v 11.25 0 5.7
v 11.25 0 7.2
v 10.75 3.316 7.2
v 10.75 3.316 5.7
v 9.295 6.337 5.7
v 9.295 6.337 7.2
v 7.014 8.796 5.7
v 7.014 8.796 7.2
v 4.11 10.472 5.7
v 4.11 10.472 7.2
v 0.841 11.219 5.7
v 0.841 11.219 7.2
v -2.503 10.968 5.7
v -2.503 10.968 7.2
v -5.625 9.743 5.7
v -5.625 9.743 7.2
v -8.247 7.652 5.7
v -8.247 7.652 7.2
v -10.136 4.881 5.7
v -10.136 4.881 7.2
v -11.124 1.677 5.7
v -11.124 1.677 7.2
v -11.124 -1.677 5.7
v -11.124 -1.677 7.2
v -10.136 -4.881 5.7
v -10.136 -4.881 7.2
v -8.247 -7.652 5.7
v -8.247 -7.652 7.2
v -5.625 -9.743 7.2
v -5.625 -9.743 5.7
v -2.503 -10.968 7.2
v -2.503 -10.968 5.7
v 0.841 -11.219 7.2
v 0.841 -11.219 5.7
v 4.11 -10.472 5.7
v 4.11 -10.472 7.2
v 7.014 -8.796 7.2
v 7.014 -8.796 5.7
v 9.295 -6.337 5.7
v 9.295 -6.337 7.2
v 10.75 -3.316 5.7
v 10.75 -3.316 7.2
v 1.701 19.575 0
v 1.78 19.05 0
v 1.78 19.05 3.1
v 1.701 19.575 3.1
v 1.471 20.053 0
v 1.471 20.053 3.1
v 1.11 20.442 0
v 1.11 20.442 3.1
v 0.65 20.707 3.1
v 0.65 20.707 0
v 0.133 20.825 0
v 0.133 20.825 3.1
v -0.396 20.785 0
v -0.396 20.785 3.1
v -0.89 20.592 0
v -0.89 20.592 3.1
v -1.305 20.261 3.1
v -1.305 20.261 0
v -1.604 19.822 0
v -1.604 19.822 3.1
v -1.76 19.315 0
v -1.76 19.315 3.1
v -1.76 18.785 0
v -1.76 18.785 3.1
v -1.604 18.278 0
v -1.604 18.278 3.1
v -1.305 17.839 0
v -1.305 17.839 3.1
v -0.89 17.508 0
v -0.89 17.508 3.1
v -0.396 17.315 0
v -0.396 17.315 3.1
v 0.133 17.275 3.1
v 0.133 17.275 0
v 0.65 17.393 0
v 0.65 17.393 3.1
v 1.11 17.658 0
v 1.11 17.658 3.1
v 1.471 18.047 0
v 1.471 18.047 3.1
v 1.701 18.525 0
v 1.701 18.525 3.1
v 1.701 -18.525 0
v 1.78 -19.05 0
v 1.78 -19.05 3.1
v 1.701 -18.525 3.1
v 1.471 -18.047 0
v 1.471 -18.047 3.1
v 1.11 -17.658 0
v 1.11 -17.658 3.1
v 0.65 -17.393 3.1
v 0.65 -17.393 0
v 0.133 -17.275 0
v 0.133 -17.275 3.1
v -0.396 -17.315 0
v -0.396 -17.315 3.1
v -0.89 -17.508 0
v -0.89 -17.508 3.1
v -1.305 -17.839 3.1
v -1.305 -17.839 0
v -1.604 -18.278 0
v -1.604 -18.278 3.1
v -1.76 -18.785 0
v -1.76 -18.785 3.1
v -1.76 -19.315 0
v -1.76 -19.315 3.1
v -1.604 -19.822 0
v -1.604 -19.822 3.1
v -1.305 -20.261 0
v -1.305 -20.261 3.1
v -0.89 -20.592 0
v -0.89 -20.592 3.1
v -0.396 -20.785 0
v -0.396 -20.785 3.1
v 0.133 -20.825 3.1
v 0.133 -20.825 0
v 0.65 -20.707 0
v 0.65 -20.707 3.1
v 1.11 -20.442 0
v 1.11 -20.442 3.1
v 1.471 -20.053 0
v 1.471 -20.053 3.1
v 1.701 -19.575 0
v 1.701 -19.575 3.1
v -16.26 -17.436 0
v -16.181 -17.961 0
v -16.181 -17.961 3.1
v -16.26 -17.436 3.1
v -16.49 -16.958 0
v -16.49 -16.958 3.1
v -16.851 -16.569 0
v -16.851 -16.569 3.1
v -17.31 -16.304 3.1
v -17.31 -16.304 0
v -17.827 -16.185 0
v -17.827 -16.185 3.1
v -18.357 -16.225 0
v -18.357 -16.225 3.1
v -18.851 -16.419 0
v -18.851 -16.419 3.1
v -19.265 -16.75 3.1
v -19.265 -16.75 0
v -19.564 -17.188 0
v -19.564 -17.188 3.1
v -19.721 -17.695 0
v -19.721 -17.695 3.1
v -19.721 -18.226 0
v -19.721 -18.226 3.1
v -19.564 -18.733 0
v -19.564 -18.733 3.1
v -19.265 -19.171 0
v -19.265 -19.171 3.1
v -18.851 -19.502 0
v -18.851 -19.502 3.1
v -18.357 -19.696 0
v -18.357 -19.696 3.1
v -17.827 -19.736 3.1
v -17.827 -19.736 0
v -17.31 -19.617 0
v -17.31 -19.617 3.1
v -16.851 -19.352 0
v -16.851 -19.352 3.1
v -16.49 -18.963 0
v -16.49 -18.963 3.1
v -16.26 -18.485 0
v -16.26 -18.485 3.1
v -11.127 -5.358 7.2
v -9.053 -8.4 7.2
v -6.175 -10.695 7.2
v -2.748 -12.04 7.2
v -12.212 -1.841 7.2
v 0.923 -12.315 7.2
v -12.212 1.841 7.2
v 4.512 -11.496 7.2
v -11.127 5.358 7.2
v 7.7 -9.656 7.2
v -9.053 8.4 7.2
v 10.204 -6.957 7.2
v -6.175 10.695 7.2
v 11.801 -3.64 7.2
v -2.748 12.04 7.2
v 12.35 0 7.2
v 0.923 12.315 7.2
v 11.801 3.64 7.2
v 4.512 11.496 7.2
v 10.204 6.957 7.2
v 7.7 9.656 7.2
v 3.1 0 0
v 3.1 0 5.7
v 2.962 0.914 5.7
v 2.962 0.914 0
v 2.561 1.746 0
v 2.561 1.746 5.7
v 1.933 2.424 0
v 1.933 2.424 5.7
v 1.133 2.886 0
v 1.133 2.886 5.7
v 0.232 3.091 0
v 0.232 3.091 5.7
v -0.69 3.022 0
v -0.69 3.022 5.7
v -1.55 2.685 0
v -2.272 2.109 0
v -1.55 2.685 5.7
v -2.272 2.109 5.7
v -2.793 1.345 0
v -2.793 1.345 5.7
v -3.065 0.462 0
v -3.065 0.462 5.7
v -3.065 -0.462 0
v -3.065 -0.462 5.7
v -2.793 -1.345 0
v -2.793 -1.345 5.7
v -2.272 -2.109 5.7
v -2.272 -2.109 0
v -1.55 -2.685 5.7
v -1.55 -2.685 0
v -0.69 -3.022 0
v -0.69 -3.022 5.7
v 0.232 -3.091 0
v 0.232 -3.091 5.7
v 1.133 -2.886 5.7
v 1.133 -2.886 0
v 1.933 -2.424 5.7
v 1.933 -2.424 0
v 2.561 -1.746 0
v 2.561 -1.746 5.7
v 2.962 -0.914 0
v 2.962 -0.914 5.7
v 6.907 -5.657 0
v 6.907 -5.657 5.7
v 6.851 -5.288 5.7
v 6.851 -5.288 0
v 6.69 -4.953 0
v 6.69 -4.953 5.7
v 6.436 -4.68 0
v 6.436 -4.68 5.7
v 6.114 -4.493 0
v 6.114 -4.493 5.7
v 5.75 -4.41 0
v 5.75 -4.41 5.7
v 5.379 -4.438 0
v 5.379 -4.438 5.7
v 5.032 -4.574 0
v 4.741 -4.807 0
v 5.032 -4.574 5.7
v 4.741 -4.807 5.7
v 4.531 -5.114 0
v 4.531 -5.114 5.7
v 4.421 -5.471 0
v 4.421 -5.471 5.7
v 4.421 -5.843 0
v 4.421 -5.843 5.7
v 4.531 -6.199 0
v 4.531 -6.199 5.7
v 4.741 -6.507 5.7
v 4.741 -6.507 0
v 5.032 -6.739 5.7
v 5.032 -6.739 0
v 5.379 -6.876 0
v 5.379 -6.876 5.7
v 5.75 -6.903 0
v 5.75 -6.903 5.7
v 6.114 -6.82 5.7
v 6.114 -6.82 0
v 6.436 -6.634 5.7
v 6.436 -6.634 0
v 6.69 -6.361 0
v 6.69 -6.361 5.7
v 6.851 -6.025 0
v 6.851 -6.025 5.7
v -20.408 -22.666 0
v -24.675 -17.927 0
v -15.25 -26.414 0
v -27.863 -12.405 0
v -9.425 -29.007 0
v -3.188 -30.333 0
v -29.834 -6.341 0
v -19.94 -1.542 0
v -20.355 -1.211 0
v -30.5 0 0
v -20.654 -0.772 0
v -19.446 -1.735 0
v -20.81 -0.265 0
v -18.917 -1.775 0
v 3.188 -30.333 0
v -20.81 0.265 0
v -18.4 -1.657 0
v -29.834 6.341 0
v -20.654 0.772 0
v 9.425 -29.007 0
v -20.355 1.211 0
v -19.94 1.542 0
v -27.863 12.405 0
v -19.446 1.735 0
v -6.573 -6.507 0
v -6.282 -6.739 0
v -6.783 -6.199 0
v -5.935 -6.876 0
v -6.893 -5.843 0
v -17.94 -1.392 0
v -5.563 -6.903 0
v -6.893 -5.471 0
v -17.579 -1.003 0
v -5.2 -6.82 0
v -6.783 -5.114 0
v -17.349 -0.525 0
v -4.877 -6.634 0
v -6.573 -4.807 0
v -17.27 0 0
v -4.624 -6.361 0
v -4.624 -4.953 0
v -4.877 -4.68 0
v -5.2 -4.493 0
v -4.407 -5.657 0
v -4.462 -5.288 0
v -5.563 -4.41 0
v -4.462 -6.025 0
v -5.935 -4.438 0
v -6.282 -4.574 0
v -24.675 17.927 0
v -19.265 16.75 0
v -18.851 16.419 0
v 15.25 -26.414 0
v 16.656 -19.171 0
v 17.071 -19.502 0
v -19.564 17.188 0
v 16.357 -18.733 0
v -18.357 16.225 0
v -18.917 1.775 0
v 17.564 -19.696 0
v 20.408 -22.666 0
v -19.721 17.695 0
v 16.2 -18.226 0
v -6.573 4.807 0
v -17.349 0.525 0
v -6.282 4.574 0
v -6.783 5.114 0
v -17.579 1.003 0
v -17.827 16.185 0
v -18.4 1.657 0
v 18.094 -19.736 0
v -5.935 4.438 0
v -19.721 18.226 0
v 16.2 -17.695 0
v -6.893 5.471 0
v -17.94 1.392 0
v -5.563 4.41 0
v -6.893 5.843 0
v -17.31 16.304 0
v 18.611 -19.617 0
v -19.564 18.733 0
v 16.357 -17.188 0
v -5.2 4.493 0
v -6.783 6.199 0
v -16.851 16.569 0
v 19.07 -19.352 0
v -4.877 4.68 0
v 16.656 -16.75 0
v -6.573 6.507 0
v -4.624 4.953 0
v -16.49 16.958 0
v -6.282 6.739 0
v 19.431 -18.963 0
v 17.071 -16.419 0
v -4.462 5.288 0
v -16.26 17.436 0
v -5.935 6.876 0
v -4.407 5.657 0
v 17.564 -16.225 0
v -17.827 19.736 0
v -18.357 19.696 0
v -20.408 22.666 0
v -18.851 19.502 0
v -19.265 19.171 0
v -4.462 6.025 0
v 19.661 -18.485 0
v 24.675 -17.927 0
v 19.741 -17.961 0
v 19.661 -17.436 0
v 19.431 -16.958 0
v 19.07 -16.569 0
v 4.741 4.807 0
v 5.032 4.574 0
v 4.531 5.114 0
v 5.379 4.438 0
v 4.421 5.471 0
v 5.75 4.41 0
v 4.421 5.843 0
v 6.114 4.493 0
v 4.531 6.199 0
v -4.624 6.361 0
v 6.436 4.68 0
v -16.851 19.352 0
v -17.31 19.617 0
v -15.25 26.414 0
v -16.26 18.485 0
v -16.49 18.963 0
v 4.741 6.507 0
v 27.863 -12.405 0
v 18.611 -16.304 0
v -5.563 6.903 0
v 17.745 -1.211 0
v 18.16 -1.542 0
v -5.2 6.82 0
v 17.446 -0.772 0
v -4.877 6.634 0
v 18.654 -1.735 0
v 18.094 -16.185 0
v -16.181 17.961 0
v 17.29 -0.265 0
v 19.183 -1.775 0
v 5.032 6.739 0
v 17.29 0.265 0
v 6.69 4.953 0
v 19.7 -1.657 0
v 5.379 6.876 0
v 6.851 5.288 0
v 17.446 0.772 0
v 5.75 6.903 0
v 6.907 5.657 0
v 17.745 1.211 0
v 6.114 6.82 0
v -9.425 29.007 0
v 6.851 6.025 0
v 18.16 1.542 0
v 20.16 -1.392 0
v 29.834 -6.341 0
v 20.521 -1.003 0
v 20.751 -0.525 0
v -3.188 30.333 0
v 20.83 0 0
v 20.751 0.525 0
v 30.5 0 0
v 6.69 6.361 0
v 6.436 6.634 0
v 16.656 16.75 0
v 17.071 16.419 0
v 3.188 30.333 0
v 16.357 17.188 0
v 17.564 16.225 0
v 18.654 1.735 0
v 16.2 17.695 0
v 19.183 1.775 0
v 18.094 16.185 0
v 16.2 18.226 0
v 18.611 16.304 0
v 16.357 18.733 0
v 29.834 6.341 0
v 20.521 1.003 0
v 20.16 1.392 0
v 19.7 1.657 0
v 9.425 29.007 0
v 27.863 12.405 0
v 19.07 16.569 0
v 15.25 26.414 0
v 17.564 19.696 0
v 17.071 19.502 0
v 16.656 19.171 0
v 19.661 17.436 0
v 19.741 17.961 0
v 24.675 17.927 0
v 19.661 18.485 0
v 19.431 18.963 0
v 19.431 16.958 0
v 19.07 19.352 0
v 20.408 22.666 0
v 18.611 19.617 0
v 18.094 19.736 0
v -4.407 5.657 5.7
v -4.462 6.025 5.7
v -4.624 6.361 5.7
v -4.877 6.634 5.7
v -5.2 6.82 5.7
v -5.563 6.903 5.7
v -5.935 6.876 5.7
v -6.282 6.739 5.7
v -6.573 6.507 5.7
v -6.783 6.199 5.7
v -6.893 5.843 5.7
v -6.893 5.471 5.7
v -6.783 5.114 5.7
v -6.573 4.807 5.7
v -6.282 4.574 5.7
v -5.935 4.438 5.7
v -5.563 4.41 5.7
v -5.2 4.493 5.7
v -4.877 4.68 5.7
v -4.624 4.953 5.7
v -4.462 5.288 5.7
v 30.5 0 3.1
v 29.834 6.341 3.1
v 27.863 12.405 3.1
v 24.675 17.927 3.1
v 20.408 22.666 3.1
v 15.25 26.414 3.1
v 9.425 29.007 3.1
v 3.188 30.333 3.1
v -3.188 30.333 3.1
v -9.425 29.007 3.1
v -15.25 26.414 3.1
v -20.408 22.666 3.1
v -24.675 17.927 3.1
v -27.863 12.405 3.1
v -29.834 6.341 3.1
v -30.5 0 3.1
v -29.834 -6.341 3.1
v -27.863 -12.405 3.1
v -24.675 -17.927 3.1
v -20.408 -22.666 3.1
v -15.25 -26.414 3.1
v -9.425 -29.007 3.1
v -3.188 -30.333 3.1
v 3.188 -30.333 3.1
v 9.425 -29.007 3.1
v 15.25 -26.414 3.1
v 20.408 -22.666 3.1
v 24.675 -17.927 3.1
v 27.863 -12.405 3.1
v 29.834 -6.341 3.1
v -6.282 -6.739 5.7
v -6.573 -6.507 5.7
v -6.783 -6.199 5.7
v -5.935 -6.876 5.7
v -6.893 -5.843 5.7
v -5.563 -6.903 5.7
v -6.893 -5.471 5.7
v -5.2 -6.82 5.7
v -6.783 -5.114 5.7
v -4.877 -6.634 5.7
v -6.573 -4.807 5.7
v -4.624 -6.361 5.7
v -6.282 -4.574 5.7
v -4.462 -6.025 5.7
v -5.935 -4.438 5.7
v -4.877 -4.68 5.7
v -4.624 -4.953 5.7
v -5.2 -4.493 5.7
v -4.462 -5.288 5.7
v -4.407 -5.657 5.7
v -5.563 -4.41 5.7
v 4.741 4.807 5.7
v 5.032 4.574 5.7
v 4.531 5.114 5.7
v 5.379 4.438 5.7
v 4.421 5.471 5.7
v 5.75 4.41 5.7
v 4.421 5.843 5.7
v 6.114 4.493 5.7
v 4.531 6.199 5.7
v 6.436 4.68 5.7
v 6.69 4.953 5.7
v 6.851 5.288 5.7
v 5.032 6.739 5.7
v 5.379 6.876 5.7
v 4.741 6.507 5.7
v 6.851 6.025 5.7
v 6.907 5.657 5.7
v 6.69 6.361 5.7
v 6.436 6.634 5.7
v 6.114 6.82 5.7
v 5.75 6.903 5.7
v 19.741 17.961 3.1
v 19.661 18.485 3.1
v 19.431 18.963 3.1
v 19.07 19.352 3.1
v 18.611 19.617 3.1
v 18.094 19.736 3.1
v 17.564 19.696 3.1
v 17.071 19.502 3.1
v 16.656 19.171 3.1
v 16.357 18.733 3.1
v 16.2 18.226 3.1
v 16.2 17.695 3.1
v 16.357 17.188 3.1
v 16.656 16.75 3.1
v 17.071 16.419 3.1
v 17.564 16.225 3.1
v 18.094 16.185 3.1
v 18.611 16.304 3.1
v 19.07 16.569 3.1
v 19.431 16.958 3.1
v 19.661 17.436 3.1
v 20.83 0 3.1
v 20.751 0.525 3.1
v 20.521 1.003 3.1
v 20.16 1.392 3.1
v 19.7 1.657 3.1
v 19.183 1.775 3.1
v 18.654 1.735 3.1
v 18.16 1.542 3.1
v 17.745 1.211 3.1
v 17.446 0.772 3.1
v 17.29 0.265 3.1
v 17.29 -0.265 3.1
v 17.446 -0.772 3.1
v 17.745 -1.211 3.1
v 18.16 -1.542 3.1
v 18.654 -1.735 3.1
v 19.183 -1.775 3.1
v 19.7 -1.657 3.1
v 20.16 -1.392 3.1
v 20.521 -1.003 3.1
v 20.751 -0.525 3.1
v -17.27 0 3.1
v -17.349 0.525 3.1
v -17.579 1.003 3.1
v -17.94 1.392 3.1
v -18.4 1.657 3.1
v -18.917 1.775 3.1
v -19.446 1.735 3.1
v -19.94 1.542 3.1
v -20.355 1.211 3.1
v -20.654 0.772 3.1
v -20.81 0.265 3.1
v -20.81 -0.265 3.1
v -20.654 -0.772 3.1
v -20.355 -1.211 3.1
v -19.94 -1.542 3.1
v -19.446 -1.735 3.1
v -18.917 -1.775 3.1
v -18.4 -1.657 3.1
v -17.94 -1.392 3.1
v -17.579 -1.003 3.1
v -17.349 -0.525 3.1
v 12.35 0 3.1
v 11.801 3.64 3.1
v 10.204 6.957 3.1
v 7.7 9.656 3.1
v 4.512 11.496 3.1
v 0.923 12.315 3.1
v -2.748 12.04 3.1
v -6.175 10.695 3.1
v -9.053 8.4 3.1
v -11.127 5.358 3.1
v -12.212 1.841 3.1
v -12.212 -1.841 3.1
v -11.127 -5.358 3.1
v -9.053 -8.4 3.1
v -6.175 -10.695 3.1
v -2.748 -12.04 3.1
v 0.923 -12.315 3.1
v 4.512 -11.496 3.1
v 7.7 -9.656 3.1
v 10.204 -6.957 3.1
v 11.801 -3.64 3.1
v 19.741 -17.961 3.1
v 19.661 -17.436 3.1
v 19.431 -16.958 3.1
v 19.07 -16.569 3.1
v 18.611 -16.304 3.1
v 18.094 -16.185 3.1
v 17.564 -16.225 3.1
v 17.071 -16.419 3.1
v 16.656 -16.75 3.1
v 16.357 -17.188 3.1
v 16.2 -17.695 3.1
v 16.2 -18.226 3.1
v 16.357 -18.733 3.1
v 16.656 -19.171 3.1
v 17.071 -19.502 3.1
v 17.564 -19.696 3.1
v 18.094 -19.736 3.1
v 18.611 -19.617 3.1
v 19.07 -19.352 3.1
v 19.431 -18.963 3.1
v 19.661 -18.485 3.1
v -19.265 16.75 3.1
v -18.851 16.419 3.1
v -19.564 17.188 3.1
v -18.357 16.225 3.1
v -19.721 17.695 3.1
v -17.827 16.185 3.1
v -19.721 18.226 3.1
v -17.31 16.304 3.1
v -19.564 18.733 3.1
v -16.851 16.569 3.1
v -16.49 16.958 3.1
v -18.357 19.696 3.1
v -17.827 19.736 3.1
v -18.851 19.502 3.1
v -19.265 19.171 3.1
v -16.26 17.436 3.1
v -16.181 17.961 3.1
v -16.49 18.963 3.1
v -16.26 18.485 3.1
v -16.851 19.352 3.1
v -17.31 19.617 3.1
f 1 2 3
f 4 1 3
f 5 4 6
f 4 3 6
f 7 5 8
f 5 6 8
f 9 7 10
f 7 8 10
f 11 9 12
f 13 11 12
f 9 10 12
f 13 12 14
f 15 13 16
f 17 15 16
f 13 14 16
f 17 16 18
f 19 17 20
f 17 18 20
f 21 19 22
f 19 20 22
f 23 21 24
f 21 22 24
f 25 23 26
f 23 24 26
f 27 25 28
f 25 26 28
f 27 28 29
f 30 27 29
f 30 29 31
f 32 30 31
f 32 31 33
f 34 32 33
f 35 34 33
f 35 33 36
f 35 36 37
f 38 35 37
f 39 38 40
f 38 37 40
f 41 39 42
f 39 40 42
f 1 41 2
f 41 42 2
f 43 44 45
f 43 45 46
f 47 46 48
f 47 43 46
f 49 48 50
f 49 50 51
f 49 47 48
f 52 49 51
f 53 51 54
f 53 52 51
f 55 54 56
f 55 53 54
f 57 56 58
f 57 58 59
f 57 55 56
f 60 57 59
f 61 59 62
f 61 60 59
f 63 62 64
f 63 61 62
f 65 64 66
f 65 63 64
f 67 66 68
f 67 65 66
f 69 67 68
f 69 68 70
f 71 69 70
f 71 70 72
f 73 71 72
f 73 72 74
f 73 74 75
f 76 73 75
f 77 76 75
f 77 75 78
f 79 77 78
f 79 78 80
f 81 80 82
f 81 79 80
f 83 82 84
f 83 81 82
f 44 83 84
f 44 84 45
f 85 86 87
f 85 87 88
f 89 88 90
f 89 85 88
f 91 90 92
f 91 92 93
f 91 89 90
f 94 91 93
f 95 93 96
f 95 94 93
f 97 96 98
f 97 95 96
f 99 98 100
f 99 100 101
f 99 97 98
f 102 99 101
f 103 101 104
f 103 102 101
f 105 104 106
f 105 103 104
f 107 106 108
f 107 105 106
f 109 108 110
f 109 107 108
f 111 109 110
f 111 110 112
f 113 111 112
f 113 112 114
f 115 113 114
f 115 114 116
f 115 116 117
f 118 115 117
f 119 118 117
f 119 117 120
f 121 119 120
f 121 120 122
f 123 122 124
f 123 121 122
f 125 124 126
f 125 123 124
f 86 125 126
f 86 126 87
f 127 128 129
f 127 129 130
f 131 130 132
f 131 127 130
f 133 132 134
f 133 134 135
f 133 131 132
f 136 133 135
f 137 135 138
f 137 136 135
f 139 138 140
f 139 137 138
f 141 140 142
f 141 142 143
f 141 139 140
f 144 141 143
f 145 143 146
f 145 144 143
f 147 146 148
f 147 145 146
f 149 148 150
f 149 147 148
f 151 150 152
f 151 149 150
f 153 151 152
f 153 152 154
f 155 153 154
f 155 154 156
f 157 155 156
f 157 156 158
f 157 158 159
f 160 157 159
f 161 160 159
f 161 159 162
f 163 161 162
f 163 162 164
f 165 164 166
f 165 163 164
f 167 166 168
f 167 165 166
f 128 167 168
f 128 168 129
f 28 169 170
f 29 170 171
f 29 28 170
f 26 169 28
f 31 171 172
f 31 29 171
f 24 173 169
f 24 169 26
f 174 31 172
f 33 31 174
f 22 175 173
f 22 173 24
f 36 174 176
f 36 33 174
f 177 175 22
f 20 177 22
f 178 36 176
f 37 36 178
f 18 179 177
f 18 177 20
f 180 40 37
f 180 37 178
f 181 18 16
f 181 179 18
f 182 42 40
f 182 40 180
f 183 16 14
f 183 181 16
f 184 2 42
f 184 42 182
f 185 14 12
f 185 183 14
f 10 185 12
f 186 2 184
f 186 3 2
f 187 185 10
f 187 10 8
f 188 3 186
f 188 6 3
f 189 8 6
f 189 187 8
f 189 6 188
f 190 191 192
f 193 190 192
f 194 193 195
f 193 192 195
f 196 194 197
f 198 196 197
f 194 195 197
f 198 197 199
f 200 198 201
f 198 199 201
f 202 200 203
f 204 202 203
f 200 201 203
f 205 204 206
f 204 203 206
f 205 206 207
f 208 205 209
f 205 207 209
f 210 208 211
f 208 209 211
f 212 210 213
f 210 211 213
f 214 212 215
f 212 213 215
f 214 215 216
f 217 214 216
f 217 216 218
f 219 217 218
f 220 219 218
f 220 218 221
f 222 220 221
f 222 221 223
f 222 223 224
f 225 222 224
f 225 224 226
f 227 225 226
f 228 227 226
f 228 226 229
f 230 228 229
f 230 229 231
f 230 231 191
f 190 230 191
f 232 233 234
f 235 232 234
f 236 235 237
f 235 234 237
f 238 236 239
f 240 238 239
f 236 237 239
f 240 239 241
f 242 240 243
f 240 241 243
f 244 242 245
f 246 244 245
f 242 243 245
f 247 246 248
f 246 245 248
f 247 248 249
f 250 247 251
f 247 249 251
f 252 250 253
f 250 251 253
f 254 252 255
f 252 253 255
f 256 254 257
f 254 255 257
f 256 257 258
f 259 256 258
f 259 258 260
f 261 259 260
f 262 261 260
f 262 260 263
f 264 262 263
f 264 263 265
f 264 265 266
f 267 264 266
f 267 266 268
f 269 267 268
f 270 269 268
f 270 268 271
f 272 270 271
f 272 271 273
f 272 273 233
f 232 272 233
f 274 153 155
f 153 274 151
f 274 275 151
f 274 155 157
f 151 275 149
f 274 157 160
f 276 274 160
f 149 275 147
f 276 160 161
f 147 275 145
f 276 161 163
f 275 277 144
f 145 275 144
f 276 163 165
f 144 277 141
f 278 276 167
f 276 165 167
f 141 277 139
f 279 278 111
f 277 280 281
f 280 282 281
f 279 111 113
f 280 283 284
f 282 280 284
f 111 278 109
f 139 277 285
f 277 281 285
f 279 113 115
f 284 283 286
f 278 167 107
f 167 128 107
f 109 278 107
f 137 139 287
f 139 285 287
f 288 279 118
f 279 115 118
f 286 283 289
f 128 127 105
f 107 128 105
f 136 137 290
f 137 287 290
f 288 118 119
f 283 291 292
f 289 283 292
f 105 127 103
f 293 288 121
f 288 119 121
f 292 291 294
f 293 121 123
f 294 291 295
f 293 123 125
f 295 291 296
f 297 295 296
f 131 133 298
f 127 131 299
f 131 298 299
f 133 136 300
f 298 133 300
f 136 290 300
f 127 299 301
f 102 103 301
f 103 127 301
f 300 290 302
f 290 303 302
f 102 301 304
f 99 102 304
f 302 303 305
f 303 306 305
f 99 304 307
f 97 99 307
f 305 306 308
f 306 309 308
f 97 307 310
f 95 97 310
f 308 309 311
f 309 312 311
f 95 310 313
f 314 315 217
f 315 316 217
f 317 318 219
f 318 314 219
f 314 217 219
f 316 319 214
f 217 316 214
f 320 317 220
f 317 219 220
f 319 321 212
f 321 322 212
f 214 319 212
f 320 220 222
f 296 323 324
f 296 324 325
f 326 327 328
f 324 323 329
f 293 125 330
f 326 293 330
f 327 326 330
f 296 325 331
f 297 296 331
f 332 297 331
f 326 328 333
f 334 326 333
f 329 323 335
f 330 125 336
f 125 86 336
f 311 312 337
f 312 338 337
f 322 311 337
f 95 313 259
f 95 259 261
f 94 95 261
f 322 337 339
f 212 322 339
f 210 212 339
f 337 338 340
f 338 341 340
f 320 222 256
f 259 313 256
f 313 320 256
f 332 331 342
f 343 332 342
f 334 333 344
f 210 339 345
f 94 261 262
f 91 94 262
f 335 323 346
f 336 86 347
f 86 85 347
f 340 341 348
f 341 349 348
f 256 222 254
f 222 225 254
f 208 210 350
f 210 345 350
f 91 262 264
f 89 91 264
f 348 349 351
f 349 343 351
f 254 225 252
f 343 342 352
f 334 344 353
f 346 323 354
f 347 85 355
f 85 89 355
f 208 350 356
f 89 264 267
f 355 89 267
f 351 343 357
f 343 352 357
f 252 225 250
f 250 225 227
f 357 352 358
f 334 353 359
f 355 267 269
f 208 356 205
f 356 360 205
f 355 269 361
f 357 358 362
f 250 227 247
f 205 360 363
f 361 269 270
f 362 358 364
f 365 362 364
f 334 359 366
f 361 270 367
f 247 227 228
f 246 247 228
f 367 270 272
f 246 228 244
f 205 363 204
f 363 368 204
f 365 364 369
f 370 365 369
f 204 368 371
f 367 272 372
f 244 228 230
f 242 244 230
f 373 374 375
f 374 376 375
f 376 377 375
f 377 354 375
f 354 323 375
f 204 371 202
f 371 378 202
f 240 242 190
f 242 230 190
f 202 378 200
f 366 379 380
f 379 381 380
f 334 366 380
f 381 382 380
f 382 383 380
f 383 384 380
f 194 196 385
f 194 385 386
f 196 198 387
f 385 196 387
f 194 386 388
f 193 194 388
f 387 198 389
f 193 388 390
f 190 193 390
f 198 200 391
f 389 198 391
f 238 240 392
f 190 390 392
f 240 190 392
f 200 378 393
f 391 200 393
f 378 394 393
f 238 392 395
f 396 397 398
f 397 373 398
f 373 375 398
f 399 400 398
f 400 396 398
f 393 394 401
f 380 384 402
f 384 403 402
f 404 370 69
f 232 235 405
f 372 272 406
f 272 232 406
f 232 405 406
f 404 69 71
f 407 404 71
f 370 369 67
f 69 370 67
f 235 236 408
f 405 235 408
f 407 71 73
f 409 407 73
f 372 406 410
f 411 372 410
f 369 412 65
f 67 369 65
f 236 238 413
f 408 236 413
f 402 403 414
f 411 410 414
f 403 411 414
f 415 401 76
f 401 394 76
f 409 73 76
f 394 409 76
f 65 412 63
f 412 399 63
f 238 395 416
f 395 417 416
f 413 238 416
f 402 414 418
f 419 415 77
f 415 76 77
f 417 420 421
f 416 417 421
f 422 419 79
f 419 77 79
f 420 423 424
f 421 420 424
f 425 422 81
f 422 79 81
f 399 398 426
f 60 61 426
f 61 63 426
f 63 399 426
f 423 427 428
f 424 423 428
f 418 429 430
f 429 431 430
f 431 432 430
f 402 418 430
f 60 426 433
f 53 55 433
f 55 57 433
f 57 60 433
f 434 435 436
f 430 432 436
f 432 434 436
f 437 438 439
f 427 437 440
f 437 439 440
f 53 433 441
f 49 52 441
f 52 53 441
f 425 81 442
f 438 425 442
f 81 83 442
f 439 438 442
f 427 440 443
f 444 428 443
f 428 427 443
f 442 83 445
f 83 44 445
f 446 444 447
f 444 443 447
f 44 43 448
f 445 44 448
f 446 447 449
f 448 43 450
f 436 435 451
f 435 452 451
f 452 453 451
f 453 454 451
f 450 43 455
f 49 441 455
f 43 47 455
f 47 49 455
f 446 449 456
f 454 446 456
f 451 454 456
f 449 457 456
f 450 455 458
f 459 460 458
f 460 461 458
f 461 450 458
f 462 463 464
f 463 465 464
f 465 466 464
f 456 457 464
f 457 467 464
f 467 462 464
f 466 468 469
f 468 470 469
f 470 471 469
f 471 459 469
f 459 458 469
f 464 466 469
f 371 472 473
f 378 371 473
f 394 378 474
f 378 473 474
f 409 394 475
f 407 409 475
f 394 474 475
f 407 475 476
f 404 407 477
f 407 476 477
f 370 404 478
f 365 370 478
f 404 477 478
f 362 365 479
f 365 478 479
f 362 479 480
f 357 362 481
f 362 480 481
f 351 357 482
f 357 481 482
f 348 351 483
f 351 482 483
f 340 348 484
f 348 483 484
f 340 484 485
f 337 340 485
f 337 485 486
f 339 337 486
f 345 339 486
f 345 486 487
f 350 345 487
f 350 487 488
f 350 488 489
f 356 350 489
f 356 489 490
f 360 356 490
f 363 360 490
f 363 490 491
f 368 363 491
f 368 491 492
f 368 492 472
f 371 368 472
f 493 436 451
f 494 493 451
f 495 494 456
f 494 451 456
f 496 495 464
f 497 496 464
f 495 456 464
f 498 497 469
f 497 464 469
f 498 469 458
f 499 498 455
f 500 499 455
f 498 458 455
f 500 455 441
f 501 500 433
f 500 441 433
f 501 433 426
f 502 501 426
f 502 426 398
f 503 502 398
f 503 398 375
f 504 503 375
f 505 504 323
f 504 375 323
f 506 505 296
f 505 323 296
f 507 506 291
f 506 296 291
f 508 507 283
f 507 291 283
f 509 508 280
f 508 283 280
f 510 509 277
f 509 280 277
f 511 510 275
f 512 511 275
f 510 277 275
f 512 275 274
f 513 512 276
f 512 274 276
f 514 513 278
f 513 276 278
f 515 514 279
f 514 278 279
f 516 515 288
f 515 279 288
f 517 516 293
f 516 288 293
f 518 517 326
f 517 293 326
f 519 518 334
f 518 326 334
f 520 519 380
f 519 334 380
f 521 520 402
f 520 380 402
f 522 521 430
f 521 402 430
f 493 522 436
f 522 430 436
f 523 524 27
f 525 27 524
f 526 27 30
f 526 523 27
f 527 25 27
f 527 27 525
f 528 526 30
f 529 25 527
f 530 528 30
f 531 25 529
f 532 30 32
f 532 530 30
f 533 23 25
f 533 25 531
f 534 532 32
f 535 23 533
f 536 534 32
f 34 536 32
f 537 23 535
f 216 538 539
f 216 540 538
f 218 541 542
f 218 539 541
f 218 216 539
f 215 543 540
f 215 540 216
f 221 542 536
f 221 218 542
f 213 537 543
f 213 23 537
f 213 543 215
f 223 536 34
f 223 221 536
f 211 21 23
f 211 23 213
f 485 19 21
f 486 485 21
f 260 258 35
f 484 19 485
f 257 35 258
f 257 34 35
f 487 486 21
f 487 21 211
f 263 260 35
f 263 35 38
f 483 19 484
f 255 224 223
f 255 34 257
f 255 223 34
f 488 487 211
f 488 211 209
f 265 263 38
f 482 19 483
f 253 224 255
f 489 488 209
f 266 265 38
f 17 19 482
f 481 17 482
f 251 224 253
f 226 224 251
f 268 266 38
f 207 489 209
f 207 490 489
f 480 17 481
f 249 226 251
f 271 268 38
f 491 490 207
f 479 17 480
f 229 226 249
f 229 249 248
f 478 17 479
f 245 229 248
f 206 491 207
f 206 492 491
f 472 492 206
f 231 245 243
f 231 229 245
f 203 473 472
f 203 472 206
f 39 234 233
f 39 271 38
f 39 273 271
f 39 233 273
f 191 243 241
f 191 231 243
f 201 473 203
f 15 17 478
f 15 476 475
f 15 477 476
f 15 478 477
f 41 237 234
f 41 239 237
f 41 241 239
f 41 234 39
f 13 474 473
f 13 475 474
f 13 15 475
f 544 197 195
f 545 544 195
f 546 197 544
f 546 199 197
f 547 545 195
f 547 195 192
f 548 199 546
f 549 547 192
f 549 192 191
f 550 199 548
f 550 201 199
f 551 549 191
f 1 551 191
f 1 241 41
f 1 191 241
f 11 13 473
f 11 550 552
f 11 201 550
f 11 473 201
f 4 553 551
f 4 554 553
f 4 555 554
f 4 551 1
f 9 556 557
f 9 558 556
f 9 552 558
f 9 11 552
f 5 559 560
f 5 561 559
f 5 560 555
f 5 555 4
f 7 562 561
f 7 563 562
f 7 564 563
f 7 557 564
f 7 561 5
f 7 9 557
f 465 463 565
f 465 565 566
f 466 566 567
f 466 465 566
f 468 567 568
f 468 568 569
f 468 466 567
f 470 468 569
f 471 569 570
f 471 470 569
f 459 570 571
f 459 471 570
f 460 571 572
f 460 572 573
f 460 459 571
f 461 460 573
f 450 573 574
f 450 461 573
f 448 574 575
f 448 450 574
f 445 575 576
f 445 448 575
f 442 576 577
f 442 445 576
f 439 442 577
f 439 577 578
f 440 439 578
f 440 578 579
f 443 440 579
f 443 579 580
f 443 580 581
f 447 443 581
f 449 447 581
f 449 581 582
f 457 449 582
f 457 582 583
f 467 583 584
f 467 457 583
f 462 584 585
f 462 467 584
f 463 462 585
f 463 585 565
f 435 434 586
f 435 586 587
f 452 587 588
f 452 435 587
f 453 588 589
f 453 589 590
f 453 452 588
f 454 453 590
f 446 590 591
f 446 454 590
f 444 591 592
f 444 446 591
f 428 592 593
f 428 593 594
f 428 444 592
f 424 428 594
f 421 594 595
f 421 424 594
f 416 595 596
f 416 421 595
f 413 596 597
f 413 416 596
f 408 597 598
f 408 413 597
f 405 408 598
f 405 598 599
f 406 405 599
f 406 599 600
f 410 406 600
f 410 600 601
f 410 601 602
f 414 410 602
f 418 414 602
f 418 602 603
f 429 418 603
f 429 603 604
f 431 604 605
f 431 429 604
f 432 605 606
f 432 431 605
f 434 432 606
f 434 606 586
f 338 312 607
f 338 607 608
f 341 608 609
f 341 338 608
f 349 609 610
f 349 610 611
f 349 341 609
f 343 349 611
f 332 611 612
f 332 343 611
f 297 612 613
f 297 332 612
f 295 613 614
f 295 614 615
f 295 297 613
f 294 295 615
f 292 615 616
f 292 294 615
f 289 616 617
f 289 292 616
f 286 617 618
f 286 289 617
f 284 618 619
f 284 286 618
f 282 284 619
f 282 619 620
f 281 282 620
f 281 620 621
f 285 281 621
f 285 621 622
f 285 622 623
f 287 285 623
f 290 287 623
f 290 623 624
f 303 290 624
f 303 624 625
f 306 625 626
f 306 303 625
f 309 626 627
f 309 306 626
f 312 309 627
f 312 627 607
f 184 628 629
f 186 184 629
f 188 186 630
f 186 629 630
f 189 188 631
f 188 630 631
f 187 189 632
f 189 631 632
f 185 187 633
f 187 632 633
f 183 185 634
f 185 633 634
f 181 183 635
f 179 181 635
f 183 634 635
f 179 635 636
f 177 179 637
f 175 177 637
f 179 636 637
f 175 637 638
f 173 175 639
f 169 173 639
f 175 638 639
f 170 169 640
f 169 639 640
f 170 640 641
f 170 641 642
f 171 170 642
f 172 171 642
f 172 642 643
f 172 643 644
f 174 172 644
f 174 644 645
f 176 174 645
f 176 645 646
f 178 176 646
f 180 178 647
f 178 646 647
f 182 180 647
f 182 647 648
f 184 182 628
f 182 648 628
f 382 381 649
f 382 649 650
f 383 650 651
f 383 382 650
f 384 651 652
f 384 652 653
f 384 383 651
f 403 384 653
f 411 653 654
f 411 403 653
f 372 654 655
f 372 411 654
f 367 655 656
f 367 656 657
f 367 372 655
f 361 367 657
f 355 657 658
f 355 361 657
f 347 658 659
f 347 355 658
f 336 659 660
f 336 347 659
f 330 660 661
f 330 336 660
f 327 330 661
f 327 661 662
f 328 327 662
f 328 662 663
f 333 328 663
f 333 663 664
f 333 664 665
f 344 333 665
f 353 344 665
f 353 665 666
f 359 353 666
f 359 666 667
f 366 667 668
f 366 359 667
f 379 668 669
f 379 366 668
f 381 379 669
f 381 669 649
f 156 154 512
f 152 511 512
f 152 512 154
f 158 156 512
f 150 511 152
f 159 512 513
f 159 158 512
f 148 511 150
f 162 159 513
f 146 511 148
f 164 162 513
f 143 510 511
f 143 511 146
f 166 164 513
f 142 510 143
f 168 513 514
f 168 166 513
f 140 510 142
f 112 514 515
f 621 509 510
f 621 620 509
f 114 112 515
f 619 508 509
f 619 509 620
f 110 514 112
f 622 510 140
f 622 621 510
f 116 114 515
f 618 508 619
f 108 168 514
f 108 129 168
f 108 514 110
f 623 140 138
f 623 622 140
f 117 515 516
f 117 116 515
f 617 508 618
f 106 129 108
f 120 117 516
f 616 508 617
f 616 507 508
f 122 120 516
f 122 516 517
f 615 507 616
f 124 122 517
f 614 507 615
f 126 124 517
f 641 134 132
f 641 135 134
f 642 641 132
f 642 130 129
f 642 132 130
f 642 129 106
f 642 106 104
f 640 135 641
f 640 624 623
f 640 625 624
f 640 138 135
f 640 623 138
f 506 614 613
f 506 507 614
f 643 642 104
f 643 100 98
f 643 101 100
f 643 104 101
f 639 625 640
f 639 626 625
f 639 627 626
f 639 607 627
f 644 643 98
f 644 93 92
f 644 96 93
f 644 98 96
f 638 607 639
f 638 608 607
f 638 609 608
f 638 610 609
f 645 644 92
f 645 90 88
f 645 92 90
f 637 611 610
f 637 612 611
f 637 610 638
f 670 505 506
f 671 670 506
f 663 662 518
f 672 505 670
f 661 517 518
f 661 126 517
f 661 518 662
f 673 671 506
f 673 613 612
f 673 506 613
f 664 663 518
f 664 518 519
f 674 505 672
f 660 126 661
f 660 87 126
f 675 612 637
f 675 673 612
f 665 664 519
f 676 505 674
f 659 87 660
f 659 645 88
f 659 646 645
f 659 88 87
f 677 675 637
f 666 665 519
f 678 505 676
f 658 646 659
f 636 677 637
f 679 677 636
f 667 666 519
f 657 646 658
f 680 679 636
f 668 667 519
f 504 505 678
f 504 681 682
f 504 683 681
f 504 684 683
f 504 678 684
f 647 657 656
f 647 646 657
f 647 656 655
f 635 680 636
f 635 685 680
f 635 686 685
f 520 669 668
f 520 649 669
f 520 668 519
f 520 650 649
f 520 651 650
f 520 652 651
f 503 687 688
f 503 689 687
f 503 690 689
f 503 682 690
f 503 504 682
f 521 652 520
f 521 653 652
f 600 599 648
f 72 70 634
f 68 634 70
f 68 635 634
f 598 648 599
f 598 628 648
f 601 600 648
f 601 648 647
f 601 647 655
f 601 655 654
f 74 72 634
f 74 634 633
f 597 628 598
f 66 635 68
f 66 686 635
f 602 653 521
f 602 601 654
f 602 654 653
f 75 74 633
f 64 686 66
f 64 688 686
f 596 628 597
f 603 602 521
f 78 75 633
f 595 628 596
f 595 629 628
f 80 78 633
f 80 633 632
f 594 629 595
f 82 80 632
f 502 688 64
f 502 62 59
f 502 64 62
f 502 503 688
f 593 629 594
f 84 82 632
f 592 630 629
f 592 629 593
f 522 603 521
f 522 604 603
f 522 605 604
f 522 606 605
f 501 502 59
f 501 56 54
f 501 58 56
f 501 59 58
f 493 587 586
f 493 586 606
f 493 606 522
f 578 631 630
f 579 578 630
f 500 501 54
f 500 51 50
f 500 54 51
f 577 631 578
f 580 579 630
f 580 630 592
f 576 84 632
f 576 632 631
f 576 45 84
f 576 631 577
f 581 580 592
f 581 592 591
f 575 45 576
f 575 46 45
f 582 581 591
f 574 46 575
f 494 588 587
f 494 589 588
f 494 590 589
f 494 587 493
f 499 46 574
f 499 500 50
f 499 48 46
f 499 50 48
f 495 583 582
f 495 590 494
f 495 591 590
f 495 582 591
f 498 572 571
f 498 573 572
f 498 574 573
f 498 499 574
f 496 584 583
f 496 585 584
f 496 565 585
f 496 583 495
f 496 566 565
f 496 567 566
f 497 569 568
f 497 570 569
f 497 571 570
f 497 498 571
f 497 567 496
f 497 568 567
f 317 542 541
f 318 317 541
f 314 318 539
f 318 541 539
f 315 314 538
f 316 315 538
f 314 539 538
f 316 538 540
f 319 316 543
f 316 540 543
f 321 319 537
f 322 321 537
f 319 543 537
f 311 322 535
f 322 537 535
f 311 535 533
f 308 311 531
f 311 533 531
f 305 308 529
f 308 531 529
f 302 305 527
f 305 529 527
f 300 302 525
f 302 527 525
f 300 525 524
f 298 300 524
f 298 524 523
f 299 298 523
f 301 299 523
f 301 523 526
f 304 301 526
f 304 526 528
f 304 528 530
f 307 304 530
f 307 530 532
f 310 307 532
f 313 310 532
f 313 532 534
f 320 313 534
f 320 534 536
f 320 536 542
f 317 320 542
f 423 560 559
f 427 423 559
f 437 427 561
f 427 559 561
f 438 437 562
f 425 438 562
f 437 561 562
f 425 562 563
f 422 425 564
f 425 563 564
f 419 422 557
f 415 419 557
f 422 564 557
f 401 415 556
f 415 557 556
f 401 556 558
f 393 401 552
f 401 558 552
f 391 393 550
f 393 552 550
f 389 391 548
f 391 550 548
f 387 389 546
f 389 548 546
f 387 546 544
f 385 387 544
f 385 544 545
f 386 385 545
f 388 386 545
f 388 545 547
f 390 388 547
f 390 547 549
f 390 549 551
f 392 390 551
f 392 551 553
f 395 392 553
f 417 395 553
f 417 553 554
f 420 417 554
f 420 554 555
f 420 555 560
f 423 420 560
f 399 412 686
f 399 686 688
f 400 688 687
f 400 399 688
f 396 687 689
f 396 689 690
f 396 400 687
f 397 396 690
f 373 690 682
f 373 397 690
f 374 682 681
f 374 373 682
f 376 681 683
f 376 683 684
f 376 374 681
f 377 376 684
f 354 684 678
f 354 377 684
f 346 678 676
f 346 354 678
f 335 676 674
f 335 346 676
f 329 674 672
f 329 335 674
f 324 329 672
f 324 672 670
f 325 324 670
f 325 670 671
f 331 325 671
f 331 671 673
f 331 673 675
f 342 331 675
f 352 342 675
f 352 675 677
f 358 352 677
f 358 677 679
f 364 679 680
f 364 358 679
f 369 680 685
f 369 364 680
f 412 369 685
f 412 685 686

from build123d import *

# Parameters (mm, degrees)
SKETCH1_R           = 30.5
SKETCH1_R_2         = 1.78
BOSS_EXTRUDE1_DEPTH = 3.1
SKETCH2_R           = 12.35
BOSS_EXTRUDE2_DEPTH = 4.1
SKETCH3_R           = 11.25
CUT_EXTRUDE1_DEPTH  = 1.5
SKETCH4_R           = 1.25
SKETCH4_R_2         = 3.1
CUT_EXTRUDE2_DEPTH  = 6.7


with BuildPart() as part:
    # Sketch1 → Boss-Extrude1 (new body)
    with BuildSketch(Plane.XY):
        Circle(SKETCH1_R)
        with Locations((0, 19.05)):
            Circle(SKETCH1_R_2, mode=Mode.SUBTRACT)
        with Locations((19.05, 0)):
            Circle(SKETCH1_R_2, mode=Mode.SUBTRACT)
        with Locations((0, -19.05)):
            Circle(SKETCH1_R_2, mode=Mode.SUBTRACT)
        with Locations((-19.05, 0)):
            Circle(SKETCH1_R_2, mode=Mode.SUBTRACT)
        with Locations((17.960512242, 17.960512242)):
            Circle(SKETCH1_R_2, mode=Mode.SUBTRACT)
        with Locations((17.960512242, -17.960512242)):
            Circle(SKETCH1_R_2, mode=Mode.SUBTRACT)
        with Locations((-17.960512242, -17.960512242)):
            Circle(SKETCH1_R_2, mode=Mode.SUBTRACT)
        with Locations((-17.960512242, 17.960512242)):
            Circle(SKETCH1_R_2, mode=Mode.SUBTRACT)
    extrude(amount=BOSS_EXTRUDE1_DEPTH)

    # Sketch2 → Boss-Extrude2 (add)
    with BuildSketch(Plane.XY.offset(3.1)):
        Circle(SKETCH2_R)
    extrude(amount=BOSS_EXTRUDE2_DEPTH)

    # Sketch3 → Cut-Extrude1 (cut)
    with BuildSketch(Plane.XY.offset(7.2)):
        Circle(SKETCH3_R)
    extrude(amount=-CUT_EXTRUDE1_DEPTH, mode=Mode.SUBTRACT)

    # Sketch4 → Cut-Extrude2 (cut, through all)
    with BuildSketch(Plane.XY.offset(5.7)):
        with Locations((5.656854249, 5.656854249)):
            Circle(SKETCH4_R)
        with Locations((5.656854249, -5.656854249)):
            Circle(SKETCH4_R)
        with Locations((-5.656854249, -5.656854249)):
            Circle(SKETCH4_R)
        with Locations((-5.656854249, 5.656854249)):
            Circle(SKETCH4_R)
        Circle(SKETCH4_R_2)
    extrude(amount=-CUT_EXTRUDE2_DEPTH, mode=Mode.SUBTRACT)


solid = part.part
